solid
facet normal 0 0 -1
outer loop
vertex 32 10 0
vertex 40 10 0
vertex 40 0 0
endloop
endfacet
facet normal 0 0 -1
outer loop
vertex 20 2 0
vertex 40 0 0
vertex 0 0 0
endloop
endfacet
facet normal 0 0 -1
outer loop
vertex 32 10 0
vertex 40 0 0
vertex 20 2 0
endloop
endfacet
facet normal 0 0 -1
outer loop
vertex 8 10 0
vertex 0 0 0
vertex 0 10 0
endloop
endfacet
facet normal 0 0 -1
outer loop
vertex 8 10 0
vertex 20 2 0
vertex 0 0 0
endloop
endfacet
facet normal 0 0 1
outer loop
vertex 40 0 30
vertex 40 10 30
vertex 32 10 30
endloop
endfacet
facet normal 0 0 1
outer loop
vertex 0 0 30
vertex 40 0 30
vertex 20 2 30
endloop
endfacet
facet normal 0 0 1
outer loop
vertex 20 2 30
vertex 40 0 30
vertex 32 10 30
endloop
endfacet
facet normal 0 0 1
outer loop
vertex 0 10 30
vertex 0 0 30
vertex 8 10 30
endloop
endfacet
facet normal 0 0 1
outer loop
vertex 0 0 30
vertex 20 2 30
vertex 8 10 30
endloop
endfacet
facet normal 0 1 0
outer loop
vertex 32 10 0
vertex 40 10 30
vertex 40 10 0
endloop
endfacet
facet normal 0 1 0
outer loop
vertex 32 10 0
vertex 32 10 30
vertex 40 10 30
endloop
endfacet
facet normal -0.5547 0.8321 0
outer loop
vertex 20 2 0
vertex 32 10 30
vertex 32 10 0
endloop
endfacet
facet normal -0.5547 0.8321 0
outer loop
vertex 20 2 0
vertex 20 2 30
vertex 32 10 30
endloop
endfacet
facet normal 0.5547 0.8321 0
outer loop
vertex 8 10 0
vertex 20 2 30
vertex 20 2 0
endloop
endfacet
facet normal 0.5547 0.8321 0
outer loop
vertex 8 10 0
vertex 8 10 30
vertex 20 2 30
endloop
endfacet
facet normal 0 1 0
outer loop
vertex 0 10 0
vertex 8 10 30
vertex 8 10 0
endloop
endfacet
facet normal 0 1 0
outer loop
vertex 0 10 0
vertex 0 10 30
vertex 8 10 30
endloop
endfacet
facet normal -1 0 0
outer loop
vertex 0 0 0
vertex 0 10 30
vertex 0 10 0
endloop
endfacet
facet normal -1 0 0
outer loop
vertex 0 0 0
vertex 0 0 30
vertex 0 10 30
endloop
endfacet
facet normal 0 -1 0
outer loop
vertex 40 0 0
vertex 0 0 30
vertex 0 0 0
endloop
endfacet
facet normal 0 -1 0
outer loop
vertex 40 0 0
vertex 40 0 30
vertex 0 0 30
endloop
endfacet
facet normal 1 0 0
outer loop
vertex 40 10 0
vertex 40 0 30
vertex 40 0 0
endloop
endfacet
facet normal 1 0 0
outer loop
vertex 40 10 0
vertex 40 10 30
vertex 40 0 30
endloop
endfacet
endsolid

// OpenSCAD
$fn = 32;

// ----------------------------------------------------------------------
// V guide rail: vway, 40 mm wide
// ----------------------------------------------------------------------

// --- parameters (mm) ---
rail_w = 40;              // rail width, X
base_t = 10;              // base plate thickness
v_depth = 8;              // V feature depth / height
v_half_w = 12;            // half width of the V at the base face
plate_t = 30;             // rail length, Z (the extrusion height)

profile = [[0, 0], [40, 0], [40, 10], [32, 10], [20, 2], [8, 10], [0, 10]];  // primary outline, 7 points, counter clockwise

// --- the one profile operation ---
linear_extrude(height = plate_t) polygon(points = profile);
